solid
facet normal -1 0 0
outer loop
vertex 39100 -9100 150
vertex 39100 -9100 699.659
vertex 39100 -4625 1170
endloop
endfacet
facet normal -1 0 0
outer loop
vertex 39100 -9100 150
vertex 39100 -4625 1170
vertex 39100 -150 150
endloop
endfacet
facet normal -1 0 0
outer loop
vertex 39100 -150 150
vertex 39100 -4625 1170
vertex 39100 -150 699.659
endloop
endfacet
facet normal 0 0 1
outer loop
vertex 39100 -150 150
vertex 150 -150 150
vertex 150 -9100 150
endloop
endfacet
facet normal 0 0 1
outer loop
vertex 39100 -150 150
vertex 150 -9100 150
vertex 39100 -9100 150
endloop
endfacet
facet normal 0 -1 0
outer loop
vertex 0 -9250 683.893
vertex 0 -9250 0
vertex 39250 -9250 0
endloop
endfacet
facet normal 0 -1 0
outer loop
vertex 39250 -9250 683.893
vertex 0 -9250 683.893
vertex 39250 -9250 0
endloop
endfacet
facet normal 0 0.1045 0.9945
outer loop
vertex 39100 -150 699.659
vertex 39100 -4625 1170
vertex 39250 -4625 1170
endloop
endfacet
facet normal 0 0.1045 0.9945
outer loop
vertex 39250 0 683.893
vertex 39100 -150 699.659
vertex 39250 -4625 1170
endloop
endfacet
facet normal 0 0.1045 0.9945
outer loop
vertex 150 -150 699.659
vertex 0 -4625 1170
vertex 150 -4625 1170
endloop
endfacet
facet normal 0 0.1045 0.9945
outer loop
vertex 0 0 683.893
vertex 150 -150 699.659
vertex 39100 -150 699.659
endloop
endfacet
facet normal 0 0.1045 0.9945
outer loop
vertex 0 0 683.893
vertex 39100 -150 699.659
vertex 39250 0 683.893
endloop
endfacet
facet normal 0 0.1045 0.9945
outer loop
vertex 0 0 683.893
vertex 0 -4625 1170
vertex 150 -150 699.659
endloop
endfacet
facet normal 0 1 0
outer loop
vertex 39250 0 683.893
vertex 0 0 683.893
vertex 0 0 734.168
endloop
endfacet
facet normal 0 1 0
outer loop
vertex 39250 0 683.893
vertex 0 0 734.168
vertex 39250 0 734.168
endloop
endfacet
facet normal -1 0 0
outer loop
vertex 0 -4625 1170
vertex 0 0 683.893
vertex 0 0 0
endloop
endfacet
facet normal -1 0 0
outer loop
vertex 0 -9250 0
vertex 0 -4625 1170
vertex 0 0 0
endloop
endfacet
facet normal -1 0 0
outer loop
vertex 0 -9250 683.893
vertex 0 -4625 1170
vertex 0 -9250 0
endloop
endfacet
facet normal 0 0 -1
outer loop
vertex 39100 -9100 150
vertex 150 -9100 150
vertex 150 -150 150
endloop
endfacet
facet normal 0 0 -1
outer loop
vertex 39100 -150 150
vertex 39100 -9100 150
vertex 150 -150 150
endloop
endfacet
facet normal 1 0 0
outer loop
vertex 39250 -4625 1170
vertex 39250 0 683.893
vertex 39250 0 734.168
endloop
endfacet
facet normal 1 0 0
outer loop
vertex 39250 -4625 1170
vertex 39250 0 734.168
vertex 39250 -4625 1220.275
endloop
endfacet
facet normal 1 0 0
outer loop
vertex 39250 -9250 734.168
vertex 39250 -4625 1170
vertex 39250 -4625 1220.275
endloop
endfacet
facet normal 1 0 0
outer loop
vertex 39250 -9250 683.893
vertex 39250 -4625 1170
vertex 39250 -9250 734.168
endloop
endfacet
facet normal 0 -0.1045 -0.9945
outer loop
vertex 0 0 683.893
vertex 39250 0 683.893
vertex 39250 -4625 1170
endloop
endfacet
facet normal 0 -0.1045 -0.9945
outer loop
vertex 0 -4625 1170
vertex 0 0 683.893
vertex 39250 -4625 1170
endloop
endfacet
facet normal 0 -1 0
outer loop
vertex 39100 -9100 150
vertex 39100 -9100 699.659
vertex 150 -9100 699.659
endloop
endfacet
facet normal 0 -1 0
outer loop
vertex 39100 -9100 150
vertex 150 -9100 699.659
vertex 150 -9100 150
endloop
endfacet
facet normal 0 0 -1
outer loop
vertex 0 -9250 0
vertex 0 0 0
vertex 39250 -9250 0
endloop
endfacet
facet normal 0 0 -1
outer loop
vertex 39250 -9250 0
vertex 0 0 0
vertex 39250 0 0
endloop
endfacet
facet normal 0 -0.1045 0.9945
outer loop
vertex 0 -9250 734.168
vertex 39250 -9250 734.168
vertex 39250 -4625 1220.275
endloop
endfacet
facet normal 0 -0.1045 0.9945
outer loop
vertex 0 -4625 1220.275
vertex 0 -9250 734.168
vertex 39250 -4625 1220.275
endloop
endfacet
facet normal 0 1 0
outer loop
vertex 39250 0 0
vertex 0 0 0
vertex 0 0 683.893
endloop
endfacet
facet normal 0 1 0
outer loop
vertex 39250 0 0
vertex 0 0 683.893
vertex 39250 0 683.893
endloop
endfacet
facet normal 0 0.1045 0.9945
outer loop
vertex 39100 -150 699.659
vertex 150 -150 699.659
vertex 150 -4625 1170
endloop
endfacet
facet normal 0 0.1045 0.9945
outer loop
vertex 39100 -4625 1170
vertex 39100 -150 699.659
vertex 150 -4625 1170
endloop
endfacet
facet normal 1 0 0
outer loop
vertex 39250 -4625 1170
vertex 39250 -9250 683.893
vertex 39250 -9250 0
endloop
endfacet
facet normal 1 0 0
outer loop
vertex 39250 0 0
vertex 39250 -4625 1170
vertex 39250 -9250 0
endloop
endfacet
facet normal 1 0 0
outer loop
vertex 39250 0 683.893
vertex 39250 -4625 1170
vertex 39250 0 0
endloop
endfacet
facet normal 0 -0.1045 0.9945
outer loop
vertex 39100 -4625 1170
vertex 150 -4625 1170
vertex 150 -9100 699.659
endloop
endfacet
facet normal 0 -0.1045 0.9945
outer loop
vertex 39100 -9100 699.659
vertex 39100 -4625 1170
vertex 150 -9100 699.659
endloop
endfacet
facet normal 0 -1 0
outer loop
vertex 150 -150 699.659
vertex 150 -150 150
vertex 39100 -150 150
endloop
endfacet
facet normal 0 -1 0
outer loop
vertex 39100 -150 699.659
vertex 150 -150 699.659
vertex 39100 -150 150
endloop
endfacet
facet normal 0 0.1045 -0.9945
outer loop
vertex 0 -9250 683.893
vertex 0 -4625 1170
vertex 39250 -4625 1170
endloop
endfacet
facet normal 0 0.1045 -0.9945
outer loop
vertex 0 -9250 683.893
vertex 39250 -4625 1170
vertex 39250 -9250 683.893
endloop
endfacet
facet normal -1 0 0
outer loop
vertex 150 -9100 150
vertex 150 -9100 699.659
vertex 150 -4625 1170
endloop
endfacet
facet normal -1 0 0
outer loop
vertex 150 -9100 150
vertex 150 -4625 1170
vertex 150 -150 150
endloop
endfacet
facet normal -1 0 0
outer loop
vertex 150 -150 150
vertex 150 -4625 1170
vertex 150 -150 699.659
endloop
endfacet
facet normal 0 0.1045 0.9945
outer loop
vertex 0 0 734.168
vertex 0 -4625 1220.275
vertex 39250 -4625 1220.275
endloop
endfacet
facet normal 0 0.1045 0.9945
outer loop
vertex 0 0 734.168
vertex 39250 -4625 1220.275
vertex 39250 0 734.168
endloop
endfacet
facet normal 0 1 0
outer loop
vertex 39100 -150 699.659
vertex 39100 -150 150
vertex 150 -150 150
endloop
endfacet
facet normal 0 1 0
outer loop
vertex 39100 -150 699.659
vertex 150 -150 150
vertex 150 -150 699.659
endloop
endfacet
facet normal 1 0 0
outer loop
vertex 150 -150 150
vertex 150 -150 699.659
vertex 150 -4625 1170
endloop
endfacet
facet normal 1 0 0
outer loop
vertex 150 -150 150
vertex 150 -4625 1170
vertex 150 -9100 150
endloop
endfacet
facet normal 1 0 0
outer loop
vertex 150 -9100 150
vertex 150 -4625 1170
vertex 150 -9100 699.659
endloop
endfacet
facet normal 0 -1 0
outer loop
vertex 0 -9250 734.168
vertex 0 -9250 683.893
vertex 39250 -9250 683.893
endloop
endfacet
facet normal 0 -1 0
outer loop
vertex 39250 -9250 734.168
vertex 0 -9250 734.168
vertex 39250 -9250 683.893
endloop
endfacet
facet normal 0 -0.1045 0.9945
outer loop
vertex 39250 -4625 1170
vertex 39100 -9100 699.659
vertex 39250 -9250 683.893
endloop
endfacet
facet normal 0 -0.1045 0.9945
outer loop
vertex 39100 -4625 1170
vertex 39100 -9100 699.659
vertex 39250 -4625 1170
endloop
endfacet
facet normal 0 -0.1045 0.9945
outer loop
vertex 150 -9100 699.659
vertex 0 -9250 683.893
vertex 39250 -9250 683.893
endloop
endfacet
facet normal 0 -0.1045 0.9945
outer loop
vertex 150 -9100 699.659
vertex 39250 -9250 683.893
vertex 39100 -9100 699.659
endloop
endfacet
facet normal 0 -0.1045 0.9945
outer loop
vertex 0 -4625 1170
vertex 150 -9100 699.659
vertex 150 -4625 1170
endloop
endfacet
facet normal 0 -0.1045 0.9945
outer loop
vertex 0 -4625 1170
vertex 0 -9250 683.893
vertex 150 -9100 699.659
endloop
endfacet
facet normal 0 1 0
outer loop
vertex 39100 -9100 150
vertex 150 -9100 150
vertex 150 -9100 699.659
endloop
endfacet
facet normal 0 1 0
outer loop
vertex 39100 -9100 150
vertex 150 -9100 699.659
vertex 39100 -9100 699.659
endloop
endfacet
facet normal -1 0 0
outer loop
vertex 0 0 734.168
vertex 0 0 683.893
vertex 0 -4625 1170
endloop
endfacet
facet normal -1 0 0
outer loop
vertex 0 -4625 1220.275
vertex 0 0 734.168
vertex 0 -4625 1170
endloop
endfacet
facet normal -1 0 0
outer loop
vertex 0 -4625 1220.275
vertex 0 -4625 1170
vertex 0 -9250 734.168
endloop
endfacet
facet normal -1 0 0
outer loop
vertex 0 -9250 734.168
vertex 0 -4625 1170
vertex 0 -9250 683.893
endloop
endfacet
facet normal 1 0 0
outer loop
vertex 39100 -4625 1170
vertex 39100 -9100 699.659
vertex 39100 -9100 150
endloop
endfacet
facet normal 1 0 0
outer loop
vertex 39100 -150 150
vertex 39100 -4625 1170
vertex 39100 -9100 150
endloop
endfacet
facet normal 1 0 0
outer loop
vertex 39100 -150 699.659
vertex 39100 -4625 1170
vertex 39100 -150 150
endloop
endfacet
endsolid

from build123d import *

# Parameters (mm, degrees)
F0_W          = 39250
F0_H          = 9250
F1_DEPTH      = 150
F2_W          = 39250
F2_H          = 9250
F2_W_2        = 38950
F2_H_2        = 8950
F3_DEPTH      = 570
F5_DEPTH      = 39250.001
F7_DEPTH      = 50
F7_DEPTH_BACK = 39300
F9_DEPTH      = 150
F11_DEPTH     = 150
F12_W         = 266.9223773158
F12_H         = 1000
F13_DEPTH     = 1220.2764139782
F14_W         = 44695.1484680176
F14_H         = 14306.3936233521
F14_W_2       = 39250
F14_H_2       = 9250
F15_DEPTH     = 1220.2764139782
F17_DEPTH     = 38950


with BuildPart() as f1:
    # F0 (on Top) → F1 (new body)
    with BuildSketch(Plane.XY):
        with Locations((19625, -4625)):
            Rectangle(F0_W, F0_H)
    extrude(amount=F1_DEPTH)

    # F2 (on face) → F3 (join)
    with BuildSketch(Plane.XY.offset(150)):
        with Locations((19625, -4625)):
            Rectangle(F2_W, F2_H)
        with Locations((19625, -4625)):
            Rectangle(F2_W_2, F2_H_2, mode=Mode.SUBTRACT)
    extrude(amount=F3_DEPTH)

    # F4 (on face) → F5 (cut, through all)
    with BuildSketch(Plane(origin=(0, 0, 0), x_dir=(0, -1, 0), z_dir=(-1, 0, 0))):
        Polygon((-659.6078069495, 614.5653377715), (4625, 1170), (1956.3378095627, 2374.1724491119), align=None)
        Polygon((7293.6621904373, 2374.1724491119), (4625, 1170), (9909.6078069495, 614.5653377715), align=None)
    extrude(amount=-F5_DEPTH, mode=Mode.SUBTRACT)

    # F8 (on face) → F9 (join)
    with BuildSketch(Plane.YZ.offset(39250)):
        Polygon((-8906.4640044002, 720), (-343.5359955999, 720), (-4625, 1170), align=None)
    extrude(amount=-F9_DEPTH)

    # F10 (on face) → F11 (join)
    with BuildSketch(Plane(origin=(0, 0, 0), x_dir=(0, -1, 0), z_dir=(-1, 0, 0))):
        Polygon((4625, 1170), (343.5359955998, 720), (8906.4640044001, 720), align=None)
    extrude(amount=-F11_DEPTH)


with BuildPart() as f7:
    # F6 (on face) → F7 (new body, two sides)
    with BuildSketch(Plane(origin=(0, 0, 0), x_dir=(0, -1, 0), z_dir=(-1, 0, 0))) as f7_sk:
        Polygon((-98.9790029993, 673.4897994786), (4625, 1170), (9348.9790029993, 673.4897994786), (9354.2054261627, 723.2158942471), (4625, 1220.2754139782), (-104.2054261627, 723.2158942471), align=None)
    extrude(amount=F7_DEPTH)
    extrude(f7_sk.sketch, amount=-F7_DEPTH_BACK)

    # F12 (on face) → F13 (cut, through all)
    with BuildSketch(Plane(origin=(0, 0, 0), x_dir=(1, 0, 0), z_dir=(0, 0, -1))):
        with Locations((-133.4611886579, 600)):
            Rectangle(F12_W, F12_H)
    extrude(amount=-F13_DEPTH, mode=Mode.SUBTRACT)

    # F14 (on face) → F15 (cut, through all)
    with BuildSketch(Plane(origin=(0, 0, 0), x_dir=(1, 0, 0), z_dir=(0, 0, -1))):
        with Locations((18414.8387908936, 3717.1730995178)):
            Rectangle(F14_W, F14_H)
        with Locations((19625, 4625)):
            Rectangle(F14_W_2, F14_H_2, mode=Mode.SUBTRACT)
    extrude(amount=-F15_DEPTH, mode=Mode.SUBTRACT)


with BuildPart() as f17:
    # F16 (on face) → F17 (new body, through all)
    with BuildSketch(Plane.YZ.offset(150)):
        Polygon((-9100, 150), (-150, 150), (-150, 699.6585471861), (-4625, 1170), (-9100, 699.6585471861), align=None)
    extrude(amount=F17_DEPTH)


solid = Compound([f1.part, f7.part, f17.part])
